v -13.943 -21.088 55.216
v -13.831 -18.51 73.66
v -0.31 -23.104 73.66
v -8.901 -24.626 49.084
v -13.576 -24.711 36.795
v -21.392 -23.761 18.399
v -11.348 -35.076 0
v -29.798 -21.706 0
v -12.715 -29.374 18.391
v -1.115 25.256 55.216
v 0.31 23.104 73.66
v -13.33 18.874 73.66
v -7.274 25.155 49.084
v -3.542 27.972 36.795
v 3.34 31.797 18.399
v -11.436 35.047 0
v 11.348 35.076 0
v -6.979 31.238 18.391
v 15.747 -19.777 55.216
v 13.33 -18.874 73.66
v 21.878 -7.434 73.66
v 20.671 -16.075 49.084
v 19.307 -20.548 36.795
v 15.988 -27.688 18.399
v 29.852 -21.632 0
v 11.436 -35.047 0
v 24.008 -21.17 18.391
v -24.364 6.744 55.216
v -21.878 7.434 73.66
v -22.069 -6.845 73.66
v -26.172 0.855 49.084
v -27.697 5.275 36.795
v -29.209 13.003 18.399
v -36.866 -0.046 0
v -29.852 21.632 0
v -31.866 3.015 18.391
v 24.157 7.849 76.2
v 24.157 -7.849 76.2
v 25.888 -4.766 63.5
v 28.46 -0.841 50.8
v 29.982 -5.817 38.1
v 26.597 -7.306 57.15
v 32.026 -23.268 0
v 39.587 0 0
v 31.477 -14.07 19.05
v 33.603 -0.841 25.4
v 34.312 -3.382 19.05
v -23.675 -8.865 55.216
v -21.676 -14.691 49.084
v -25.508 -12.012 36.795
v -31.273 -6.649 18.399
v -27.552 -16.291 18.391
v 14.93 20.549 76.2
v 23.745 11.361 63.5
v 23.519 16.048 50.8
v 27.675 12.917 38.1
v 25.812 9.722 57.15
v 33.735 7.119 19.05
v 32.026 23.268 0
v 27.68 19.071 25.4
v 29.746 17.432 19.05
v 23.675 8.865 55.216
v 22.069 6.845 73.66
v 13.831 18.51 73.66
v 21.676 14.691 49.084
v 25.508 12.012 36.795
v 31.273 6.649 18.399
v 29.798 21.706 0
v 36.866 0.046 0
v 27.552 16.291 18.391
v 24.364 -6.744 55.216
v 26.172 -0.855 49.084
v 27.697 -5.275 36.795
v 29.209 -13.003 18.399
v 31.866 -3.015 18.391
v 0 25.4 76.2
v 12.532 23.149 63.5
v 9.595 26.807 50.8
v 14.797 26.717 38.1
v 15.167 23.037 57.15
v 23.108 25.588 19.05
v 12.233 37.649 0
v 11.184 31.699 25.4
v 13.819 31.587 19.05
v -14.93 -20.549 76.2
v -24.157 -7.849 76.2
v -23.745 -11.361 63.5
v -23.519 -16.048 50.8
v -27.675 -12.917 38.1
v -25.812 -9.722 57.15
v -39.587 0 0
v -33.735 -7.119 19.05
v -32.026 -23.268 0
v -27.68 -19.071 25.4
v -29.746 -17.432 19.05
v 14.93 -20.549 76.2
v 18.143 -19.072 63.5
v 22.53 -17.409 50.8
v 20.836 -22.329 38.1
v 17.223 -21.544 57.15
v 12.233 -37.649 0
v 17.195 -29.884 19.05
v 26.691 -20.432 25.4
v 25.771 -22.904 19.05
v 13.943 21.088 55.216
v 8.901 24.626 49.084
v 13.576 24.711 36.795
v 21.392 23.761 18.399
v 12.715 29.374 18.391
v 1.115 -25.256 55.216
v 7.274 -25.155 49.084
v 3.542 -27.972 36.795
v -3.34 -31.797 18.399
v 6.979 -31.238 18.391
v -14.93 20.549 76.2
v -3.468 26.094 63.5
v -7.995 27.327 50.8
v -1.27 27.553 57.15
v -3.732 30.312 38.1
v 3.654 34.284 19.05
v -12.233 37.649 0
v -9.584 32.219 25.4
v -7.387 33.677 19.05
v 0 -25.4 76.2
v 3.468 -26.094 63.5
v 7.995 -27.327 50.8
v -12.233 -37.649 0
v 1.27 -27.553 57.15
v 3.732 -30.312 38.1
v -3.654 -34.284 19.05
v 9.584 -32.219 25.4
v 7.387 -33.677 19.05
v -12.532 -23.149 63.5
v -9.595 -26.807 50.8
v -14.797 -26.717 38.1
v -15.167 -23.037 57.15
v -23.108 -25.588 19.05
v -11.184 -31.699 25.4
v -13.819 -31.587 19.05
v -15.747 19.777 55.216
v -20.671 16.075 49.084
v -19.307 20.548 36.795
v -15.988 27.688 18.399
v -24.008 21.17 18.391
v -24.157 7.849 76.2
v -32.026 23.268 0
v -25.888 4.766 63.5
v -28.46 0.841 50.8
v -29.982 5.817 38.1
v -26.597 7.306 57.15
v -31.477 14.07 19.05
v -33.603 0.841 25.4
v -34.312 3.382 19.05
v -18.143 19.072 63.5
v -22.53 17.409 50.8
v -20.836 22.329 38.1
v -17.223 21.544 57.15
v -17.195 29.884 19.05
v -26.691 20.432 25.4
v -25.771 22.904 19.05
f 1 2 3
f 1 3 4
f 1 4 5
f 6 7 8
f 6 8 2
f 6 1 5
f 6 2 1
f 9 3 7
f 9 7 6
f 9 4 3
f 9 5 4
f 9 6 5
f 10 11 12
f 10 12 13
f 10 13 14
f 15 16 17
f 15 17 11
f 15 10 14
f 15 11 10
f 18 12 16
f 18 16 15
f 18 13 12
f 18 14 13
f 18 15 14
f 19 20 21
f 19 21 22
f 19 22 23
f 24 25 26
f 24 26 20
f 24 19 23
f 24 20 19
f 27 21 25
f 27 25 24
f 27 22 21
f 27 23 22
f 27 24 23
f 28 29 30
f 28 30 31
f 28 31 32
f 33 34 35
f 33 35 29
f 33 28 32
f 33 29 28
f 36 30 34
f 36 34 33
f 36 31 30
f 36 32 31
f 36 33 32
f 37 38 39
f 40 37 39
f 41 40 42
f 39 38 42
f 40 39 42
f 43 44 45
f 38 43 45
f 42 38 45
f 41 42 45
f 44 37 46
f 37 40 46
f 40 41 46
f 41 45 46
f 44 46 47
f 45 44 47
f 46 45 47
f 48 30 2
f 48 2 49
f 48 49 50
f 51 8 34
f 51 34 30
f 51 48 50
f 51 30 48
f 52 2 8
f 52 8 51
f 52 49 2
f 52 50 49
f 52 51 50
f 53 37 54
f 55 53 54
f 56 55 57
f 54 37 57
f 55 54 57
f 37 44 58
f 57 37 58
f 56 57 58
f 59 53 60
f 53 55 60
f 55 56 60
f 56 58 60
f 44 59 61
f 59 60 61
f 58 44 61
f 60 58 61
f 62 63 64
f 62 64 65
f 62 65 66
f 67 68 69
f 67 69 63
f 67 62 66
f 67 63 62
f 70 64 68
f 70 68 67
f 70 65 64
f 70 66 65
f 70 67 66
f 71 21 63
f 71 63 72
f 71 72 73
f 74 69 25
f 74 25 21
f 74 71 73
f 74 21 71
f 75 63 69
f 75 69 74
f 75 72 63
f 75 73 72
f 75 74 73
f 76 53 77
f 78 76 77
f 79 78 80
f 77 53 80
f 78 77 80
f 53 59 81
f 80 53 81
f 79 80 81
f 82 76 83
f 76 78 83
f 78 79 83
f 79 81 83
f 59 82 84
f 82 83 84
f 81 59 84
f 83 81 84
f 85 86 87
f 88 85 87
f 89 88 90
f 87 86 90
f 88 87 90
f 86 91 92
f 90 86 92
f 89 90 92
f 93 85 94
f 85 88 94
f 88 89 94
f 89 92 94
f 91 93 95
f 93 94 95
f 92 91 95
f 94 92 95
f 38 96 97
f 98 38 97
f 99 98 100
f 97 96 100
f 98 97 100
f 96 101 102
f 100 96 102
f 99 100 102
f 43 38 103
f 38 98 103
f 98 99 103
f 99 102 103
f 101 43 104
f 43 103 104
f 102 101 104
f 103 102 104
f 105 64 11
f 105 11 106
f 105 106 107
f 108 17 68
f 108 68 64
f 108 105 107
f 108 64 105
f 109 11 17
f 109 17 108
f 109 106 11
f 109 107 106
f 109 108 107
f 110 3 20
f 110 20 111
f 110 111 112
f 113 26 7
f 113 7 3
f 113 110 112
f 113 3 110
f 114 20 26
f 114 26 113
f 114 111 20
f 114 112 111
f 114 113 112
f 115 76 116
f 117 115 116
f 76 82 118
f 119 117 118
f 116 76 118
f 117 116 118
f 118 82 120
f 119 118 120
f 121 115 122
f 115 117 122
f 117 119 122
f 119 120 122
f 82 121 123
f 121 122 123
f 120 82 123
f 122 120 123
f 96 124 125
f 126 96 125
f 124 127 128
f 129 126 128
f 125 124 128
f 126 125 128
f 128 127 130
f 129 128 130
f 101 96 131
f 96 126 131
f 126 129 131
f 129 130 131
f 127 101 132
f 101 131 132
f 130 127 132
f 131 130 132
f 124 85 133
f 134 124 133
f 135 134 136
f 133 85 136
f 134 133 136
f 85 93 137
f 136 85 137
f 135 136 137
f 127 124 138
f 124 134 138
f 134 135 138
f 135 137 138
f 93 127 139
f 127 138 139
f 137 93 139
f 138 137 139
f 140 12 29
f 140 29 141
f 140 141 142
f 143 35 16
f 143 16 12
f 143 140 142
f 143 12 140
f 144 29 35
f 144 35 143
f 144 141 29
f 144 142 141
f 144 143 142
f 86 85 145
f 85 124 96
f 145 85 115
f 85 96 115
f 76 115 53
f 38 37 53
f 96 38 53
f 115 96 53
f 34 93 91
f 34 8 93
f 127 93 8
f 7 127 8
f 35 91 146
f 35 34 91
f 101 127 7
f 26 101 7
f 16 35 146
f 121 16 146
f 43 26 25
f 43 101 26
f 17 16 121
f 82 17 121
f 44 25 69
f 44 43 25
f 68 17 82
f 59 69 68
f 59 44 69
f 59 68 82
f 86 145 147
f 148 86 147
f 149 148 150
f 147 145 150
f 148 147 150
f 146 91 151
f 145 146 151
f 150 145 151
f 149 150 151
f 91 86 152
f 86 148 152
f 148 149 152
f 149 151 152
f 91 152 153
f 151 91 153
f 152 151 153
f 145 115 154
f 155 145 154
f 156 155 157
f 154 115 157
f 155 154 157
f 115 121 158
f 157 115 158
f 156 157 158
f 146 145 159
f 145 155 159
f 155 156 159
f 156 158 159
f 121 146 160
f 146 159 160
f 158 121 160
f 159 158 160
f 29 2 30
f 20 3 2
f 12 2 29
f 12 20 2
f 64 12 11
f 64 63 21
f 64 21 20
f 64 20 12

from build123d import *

# Parameters (mm, degrees)
F4_T = -2.54


with BuildPart() as f3:
    # F2 (on offset) → F3 section 0
    with BuildSketch(Plane.XY.offset(76.2)):
        Polygon((0, -25.4), (14.9297454082, -20.5490316571), (24.1568355139, -7.8490316571), (24.1568355139, 7.8490316571), (14.9297454082, 20.5490316571), (0, 25.4), (-14.9297454082, 20.5490316571), (-24.1568355139, 7.8490316571), (-24.1568355139, -7.8490316571), (-14.9297454082, -20.5490316571), align=None)
    # F0 (on Top) → F3 section 1
    with BuildSketch(Plane.XY):
        Polygon((-12.2329573114, -37.6491713284), (12.2329573114, -37.6491713284), (32.0262980243, -23.2684675292), (39.5866814257, 0), (32.0262980243, 23.2684675292), (12.2329573114, 37.6491713284), (-12.2329573114, 37.6491713284), (-32.0262980243, 23.2684675292), (-39.5866814257, 0), (-32.0262980243, -23.2684675292), align=None)
    loft()

    # F4
    f4_openings = [f3.faces().sort_by_distance(p)[0] for p in [
        (0, 0, 0),
    ]]
    offset(amount=F4_T, openings=f4_openings)


solid = f3.part
